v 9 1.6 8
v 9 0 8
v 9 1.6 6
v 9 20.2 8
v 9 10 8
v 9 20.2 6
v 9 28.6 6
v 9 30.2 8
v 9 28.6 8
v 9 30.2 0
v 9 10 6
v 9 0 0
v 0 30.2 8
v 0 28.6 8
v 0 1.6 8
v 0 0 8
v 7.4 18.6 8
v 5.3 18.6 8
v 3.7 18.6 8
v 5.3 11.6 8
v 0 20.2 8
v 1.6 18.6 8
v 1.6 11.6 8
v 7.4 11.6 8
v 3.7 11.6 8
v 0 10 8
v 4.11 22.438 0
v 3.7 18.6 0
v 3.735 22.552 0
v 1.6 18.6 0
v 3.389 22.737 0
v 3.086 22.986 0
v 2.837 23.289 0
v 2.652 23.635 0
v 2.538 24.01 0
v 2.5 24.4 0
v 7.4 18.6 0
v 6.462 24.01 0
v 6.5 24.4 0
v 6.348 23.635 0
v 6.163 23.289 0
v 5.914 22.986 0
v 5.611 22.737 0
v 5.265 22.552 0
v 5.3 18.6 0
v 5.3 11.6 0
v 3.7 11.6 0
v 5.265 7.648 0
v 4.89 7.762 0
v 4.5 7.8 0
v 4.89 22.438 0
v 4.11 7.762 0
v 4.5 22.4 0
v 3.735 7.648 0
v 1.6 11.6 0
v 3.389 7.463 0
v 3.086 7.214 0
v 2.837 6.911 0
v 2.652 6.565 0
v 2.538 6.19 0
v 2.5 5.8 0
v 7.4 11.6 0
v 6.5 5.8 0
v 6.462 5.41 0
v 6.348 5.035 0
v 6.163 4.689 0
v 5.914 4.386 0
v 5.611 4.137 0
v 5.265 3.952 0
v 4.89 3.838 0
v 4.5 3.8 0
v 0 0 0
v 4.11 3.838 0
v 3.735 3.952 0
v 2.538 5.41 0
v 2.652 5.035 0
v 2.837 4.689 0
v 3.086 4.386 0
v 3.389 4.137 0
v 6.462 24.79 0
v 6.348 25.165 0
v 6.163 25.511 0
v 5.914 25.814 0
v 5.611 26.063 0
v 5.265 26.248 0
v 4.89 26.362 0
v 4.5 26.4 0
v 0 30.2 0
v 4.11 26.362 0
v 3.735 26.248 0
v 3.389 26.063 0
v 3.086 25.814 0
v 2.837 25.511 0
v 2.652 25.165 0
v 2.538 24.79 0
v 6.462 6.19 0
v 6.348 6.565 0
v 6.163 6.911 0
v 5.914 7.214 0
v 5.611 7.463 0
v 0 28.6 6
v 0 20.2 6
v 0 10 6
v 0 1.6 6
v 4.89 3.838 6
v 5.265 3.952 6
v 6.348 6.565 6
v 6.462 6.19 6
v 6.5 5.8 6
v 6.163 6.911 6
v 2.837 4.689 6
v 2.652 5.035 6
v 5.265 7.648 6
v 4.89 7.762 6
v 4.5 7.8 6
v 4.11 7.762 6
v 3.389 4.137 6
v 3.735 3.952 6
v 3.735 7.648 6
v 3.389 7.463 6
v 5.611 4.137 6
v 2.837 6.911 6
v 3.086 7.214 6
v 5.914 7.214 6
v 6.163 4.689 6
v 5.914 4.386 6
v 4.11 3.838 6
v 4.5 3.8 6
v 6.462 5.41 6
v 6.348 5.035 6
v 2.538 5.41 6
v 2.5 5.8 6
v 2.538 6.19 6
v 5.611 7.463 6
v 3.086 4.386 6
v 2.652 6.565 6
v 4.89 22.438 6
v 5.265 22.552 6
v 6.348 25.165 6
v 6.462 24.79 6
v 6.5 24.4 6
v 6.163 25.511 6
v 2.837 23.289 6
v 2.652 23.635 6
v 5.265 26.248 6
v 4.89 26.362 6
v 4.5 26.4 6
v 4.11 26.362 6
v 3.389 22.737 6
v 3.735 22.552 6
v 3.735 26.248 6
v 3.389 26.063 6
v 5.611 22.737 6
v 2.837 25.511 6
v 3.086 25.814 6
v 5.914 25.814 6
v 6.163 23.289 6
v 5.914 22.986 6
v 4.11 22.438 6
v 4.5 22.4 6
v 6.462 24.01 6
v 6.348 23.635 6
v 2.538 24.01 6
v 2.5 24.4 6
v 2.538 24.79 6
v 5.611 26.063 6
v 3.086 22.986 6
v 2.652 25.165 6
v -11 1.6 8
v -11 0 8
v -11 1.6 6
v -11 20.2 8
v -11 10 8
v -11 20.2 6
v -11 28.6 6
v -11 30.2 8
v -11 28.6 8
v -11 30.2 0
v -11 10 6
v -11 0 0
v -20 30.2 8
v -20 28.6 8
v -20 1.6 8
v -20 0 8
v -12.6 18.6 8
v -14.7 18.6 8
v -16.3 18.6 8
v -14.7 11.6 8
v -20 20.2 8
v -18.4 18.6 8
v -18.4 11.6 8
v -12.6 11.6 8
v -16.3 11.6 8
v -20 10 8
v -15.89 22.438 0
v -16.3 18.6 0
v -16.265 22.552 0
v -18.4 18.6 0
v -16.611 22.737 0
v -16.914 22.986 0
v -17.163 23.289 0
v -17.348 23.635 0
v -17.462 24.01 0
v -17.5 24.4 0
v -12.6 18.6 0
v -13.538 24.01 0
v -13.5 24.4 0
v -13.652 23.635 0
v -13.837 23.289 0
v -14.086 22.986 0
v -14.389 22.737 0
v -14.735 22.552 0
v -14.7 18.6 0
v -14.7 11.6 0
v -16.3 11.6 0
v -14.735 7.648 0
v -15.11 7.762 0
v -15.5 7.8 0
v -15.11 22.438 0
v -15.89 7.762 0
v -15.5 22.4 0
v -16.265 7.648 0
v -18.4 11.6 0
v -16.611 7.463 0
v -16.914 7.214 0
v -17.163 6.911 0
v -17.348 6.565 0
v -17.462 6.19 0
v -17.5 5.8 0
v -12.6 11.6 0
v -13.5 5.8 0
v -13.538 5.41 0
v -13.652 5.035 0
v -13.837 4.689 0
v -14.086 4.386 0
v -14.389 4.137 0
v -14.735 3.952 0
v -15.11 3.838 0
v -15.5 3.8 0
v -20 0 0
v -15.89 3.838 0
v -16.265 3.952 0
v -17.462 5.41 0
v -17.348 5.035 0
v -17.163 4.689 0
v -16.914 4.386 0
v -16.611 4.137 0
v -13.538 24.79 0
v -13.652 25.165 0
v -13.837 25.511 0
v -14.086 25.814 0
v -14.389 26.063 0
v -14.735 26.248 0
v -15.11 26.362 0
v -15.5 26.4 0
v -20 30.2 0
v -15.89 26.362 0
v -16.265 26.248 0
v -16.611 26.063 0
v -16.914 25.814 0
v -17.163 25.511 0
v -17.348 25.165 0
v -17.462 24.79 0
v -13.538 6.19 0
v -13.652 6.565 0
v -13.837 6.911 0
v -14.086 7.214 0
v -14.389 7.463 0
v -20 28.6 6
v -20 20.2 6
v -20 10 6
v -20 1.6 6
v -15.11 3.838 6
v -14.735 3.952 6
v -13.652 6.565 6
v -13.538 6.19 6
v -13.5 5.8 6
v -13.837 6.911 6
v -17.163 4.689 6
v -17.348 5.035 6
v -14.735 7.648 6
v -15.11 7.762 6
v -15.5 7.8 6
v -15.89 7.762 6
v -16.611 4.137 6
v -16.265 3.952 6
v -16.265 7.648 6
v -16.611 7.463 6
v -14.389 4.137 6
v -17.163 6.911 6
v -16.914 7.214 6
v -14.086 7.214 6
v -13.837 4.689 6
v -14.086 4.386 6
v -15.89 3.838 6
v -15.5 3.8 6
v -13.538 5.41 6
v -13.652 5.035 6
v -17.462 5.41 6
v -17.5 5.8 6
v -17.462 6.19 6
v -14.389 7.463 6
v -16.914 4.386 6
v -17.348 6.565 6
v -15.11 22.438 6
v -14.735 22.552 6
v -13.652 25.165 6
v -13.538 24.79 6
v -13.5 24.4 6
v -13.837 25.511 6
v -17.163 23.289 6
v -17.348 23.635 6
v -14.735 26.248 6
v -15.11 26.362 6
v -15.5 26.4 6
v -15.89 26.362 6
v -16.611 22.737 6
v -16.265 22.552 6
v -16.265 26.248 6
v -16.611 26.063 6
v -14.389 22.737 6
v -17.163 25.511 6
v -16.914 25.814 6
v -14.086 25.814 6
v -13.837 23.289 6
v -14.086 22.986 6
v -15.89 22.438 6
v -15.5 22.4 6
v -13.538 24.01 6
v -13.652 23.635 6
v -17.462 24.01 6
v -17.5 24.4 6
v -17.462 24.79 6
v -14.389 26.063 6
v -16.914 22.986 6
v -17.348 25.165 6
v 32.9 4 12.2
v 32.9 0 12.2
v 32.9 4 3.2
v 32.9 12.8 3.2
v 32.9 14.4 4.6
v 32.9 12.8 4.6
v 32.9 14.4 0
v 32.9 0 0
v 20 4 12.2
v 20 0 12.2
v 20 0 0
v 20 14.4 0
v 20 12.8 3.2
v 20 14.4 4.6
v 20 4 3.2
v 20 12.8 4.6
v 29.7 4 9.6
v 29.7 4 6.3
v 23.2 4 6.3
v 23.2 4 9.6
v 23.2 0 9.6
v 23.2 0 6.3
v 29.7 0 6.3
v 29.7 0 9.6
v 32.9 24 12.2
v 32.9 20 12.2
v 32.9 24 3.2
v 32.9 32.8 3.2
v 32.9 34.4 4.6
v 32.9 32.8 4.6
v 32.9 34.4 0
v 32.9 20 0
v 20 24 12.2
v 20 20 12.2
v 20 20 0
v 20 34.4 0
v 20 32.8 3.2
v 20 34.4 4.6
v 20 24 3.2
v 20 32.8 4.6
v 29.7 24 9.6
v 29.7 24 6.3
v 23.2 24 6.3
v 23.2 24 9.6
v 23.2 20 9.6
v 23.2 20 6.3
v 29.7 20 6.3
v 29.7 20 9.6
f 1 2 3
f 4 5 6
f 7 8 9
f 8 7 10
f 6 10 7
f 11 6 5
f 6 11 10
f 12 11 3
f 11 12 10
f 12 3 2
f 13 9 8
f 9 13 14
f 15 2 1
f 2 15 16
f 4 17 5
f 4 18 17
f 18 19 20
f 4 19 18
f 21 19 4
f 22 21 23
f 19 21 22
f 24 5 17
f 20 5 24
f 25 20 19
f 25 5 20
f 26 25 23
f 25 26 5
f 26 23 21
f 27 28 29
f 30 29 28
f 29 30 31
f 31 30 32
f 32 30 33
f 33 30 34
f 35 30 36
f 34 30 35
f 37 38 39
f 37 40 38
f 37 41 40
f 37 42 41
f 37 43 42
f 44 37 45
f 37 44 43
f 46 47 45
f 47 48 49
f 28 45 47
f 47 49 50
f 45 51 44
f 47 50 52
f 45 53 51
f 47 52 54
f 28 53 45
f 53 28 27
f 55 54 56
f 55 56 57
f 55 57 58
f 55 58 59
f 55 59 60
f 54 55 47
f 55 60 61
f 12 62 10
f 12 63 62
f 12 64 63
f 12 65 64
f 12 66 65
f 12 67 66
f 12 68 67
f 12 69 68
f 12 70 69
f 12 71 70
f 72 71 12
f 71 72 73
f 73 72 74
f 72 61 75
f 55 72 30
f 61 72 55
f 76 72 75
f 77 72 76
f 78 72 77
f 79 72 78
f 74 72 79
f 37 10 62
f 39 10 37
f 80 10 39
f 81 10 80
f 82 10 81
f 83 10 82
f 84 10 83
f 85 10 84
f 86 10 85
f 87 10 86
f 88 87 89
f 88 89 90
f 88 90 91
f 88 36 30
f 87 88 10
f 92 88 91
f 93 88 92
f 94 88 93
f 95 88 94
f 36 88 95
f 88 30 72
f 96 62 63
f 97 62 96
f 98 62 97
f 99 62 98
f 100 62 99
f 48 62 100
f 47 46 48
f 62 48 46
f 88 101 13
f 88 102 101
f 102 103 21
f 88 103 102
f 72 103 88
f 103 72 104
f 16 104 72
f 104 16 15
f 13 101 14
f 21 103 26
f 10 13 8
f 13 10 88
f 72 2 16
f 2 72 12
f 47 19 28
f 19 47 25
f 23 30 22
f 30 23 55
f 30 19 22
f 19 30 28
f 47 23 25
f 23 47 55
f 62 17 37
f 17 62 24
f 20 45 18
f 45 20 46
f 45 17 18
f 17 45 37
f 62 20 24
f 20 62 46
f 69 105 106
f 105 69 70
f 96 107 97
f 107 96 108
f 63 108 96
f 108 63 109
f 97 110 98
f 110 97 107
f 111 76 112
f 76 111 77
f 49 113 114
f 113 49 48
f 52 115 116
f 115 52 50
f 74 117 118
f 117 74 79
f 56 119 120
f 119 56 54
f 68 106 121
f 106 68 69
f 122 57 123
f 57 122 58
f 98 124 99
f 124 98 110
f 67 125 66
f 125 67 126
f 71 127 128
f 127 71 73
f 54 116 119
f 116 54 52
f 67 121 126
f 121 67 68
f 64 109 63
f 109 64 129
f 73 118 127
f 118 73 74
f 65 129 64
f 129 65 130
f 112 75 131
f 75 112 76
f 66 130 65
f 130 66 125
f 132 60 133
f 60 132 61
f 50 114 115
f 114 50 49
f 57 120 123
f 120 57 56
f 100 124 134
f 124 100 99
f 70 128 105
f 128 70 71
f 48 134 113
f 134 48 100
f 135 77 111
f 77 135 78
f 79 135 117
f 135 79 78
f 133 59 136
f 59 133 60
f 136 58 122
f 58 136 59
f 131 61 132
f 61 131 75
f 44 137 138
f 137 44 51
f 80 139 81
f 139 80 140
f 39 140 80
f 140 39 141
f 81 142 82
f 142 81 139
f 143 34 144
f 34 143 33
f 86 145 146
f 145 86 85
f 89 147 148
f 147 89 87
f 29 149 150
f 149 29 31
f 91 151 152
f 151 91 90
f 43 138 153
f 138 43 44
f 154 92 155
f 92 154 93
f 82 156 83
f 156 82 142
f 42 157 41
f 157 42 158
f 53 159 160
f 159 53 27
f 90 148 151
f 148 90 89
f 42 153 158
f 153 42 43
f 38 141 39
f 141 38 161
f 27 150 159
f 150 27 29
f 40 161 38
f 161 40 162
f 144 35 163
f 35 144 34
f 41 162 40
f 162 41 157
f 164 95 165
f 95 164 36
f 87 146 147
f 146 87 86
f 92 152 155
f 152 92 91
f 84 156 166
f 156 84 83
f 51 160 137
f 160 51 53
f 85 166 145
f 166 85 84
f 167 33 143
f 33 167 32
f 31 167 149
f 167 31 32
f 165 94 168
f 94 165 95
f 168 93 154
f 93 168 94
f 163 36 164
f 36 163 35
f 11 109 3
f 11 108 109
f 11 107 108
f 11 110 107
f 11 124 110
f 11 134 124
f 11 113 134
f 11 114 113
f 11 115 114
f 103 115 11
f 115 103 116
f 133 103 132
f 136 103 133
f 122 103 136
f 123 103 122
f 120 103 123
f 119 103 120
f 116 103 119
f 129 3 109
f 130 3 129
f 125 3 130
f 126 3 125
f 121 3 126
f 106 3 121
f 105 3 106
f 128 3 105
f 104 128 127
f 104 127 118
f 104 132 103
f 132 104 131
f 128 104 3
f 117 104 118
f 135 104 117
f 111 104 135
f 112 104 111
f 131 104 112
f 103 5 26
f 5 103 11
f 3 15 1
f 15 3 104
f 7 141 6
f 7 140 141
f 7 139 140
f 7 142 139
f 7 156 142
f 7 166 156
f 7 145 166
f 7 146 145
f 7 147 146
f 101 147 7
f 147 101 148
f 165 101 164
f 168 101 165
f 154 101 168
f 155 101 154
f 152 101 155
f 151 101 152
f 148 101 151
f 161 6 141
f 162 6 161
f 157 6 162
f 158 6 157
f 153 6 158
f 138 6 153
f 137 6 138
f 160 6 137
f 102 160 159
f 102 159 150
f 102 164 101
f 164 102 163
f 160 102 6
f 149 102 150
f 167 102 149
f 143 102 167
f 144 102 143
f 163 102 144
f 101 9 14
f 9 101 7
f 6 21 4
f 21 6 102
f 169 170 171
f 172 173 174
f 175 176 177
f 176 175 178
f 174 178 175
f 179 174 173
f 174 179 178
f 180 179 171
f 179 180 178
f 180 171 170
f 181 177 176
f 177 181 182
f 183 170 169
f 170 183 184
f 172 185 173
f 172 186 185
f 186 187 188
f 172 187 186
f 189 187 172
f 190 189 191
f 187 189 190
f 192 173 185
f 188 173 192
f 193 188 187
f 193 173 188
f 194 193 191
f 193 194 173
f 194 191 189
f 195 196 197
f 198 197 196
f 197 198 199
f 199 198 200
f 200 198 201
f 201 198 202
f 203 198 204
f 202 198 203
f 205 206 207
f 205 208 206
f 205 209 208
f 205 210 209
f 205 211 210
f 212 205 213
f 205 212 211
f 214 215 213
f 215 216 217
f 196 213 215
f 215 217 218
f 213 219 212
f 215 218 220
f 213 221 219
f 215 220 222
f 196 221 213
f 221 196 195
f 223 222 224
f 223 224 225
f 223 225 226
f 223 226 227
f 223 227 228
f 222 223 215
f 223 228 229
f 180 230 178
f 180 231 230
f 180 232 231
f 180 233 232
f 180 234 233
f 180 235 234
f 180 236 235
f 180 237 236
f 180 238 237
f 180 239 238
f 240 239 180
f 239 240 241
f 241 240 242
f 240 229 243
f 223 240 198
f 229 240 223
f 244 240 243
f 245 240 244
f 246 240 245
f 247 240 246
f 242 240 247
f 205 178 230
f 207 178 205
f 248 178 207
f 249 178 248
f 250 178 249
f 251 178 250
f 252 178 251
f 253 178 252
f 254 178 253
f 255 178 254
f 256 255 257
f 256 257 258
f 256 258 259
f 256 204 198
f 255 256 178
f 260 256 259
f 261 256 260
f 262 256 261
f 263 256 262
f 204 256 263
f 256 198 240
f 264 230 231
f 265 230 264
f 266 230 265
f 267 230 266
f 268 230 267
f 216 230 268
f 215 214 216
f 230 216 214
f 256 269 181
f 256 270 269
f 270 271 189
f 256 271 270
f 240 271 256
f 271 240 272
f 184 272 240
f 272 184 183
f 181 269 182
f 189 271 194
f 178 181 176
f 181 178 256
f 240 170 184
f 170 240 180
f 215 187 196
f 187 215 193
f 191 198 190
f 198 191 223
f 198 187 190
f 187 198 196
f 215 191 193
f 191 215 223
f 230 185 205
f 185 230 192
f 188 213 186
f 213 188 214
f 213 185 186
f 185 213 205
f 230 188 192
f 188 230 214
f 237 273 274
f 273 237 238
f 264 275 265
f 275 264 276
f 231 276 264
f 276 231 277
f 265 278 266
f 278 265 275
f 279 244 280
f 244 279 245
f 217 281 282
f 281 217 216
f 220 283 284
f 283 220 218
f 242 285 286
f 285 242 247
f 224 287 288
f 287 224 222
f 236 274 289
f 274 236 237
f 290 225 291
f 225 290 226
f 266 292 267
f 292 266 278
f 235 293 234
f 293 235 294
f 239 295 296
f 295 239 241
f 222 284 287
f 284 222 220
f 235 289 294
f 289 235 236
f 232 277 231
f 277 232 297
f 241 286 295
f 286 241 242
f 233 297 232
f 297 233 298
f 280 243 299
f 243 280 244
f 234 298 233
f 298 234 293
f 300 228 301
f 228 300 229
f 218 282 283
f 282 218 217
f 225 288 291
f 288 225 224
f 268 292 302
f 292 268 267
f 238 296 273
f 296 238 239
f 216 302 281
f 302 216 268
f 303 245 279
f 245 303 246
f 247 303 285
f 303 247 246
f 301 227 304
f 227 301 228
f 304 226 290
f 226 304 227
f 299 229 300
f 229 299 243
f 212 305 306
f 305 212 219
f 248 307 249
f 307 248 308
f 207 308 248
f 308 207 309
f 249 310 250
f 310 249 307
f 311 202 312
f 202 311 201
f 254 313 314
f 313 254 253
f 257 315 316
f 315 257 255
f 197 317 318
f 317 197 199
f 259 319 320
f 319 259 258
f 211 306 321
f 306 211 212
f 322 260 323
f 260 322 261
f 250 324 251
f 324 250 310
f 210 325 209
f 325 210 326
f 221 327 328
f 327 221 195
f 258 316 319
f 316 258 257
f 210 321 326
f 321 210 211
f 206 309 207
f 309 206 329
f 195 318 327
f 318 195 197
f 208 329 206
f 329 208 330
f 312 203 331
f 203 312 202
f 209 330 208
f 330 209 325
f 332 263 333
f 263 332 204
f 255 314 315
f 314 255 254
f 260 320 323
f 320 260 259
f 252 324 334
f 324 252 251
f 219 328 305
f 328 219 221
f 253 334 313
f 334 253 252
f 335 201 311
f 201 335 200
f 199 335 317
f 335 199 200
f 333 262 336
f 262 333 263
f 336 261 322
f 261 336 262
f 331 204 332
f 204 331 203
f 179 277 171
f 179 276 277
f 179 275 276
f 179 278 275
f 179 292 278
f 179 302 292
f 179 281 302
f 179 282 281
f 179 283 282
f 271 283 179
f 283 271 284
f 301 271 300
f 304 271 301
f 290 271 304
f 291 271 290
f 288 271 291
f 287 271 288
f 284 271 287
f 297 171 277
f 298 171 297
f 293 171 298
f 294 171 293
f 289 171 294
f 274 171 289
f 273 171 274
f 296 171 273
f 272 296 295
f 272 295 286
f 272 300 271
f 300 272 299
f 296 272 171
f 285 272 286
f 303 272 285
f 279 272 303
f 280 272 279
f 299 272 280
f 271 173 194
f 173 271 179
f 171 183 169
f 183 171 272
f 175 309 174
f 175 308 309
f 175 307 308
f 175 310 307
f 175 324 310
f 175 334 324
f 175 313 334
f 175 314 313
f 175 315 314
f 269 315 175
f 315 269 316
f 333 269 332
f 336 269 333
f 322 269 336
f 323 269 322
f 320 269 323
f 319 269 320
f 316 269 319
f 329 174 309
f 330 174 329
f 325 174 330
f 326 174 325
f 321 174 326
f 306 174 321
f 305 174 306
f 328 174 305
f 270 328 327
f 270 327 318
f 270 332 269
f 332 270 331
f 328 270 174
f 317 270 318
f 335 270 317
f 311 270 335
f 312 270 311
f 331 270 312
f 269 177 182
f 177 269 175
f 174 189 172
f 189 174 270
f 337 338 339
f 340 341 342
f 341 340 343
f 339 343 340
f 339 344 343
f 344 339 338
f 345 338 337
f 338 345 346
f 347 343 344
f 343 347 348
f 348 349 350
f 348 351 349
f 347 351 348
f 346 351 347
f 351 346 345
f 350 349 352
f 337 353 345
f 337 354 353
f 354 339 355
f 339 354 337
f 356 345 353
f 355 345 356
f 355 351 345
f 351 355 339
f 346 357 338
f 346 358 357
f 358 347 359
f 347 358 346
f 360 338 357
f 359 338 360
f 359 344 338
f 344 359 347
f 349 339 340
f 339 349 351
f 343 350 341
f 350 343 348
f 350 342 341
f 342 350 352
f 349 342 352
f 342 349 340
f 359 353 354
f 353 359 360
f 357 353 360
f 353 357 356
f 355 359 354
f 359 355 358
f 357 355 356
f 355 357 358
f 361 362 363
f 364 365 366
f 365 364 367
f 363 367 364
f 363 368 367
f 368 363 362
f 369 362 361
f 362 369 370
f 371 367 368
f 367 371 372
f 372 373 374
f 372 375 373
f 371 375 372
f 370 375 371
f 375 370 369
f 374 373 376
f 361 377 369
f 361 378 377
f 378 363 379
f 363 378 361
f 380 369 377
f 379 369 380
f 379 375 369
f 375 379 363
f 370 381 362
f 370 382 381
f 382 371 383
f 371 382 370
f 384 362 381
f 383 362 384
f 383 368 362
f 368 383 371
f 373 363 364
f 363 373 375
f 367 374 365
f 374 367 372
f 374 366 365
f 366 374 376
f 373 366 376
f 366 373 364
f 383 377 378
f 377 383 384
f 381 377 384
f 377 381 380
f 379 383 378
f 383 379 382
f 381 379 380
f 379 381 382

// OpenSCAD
// [FL_INDEX: keywords="openscad, 3d_parametric, Adjustable_Belt_Tightener, csg_solid" | COT="Parametric OpenSCAD design from 3DCodeverse"]
// Title: Adjustable Belt Tightener

// belt tightener
// (c) cahorton, 2013:  CC attribution non-commercial

// Description: adujstable belt tensioner with removable clips
// Ok to change these

// (default is sized for GT2)
belt_width = 6;		

// (default is sized for GT2)
belt_height = 1.6;	

// (height of belt when doubled so teeth interlock)
belt_doubled_height = 2.8;	

// Minimum Wall Width
wall = 1.6; 

// extra space in slits, etc
gap = 1; 

// (default sized for a #6 screw)
screw_radius = 2;	

// (default sized for a #6 nut)
nut_radius = 4.2;  	

// (how deep the block slots are)
box_depth = 8;		

// extra space between clip and block, when snapped together
clip_space = .8; 

// extra clearance for belt in the clip slot
clip_gap = .5;

// NOTE: more variables down in the clamp module

// calculated values, don't change these
swall = nut_radius-screw_radius+wall; // wall between screw and slots

box_x = (belt_height  * 2) + (wall * 3)+gap;
box_y = belt_width + gap +  (4*nut_radius)+4*wall;

slot_y = 2*swall+2*screw_radius;

echo("box_x = ", box_x);
echo("box_y = ", box_y);
echo("box_depth = ", box_depth);

module body(){
	difference(){
		
		// body cube
		cube(size=[box_x, box_y, box_depth]);
	
		// slot 1
		translate([wall,slot_y,-1])
		cube(size=[belt_height+gap/2, belt_width+gap, box_depth+2]);
	
		// slot 2
		translate([wall*2+belt_height+gap/2,slot_y,-1])
		cube(size=[belt_height+gap/2, belt_width+gap, box_depth+2]);
	
	
		// screw hole 1
		translate([box_x/2,swall+screw_radius,-1])
		cylinder(r=screw_radius, h=box_x+2, $fn=32);
	
	
		// screw hole 2
		translate([box_x/2,(box_y-(swall+screw_radius)),-1])
		cylinder(r=screw_radius, h=box_x+2, $fn=32);
	
		// nut hole 1
		translate([-1,wall,box_depth-2])
		cube(size=[box_x+2,nut_radius*2, 3]);
	
		// nut hole 2
		translate([-1,box_y-(wall+nut_radius*2),box_depth-2])
		cube(size=[box_x+2,nut_radius*2, 3]);
	
	}
}

body();

translate([-20,0,0])
body();


translate([20,0,0])
clamp();

translate([20,20,0])
clamp();


module clamp(){

	// OK to change these
	clip_gap = .5;
	width = 4;

	// Calculated values, don't change these
	bw = belt_width;
	bx=bw+clip_gap+4*wall;
	by = width;
	bz= box_x+2*wall;

	difference(){
		union(){
			//clamp body
			cube(size=[bx,by,bz]);

			// hook bridge
			cube(size=[bx,clip_space+box_depth+wall+width, 2*wall]);
			
			// hook
			translate([0,clip_space+box_depth+width,wall])
			cube(size=[bx,wall,3]);

		}
	//hole for belt
	translate([2*wall,-1,box_x/2+2*wall-belt_doubled_height/2])
	cube(size=[bw+clip_gap,width+2,belt_doubled_height+clip_gap]);

	}
}
